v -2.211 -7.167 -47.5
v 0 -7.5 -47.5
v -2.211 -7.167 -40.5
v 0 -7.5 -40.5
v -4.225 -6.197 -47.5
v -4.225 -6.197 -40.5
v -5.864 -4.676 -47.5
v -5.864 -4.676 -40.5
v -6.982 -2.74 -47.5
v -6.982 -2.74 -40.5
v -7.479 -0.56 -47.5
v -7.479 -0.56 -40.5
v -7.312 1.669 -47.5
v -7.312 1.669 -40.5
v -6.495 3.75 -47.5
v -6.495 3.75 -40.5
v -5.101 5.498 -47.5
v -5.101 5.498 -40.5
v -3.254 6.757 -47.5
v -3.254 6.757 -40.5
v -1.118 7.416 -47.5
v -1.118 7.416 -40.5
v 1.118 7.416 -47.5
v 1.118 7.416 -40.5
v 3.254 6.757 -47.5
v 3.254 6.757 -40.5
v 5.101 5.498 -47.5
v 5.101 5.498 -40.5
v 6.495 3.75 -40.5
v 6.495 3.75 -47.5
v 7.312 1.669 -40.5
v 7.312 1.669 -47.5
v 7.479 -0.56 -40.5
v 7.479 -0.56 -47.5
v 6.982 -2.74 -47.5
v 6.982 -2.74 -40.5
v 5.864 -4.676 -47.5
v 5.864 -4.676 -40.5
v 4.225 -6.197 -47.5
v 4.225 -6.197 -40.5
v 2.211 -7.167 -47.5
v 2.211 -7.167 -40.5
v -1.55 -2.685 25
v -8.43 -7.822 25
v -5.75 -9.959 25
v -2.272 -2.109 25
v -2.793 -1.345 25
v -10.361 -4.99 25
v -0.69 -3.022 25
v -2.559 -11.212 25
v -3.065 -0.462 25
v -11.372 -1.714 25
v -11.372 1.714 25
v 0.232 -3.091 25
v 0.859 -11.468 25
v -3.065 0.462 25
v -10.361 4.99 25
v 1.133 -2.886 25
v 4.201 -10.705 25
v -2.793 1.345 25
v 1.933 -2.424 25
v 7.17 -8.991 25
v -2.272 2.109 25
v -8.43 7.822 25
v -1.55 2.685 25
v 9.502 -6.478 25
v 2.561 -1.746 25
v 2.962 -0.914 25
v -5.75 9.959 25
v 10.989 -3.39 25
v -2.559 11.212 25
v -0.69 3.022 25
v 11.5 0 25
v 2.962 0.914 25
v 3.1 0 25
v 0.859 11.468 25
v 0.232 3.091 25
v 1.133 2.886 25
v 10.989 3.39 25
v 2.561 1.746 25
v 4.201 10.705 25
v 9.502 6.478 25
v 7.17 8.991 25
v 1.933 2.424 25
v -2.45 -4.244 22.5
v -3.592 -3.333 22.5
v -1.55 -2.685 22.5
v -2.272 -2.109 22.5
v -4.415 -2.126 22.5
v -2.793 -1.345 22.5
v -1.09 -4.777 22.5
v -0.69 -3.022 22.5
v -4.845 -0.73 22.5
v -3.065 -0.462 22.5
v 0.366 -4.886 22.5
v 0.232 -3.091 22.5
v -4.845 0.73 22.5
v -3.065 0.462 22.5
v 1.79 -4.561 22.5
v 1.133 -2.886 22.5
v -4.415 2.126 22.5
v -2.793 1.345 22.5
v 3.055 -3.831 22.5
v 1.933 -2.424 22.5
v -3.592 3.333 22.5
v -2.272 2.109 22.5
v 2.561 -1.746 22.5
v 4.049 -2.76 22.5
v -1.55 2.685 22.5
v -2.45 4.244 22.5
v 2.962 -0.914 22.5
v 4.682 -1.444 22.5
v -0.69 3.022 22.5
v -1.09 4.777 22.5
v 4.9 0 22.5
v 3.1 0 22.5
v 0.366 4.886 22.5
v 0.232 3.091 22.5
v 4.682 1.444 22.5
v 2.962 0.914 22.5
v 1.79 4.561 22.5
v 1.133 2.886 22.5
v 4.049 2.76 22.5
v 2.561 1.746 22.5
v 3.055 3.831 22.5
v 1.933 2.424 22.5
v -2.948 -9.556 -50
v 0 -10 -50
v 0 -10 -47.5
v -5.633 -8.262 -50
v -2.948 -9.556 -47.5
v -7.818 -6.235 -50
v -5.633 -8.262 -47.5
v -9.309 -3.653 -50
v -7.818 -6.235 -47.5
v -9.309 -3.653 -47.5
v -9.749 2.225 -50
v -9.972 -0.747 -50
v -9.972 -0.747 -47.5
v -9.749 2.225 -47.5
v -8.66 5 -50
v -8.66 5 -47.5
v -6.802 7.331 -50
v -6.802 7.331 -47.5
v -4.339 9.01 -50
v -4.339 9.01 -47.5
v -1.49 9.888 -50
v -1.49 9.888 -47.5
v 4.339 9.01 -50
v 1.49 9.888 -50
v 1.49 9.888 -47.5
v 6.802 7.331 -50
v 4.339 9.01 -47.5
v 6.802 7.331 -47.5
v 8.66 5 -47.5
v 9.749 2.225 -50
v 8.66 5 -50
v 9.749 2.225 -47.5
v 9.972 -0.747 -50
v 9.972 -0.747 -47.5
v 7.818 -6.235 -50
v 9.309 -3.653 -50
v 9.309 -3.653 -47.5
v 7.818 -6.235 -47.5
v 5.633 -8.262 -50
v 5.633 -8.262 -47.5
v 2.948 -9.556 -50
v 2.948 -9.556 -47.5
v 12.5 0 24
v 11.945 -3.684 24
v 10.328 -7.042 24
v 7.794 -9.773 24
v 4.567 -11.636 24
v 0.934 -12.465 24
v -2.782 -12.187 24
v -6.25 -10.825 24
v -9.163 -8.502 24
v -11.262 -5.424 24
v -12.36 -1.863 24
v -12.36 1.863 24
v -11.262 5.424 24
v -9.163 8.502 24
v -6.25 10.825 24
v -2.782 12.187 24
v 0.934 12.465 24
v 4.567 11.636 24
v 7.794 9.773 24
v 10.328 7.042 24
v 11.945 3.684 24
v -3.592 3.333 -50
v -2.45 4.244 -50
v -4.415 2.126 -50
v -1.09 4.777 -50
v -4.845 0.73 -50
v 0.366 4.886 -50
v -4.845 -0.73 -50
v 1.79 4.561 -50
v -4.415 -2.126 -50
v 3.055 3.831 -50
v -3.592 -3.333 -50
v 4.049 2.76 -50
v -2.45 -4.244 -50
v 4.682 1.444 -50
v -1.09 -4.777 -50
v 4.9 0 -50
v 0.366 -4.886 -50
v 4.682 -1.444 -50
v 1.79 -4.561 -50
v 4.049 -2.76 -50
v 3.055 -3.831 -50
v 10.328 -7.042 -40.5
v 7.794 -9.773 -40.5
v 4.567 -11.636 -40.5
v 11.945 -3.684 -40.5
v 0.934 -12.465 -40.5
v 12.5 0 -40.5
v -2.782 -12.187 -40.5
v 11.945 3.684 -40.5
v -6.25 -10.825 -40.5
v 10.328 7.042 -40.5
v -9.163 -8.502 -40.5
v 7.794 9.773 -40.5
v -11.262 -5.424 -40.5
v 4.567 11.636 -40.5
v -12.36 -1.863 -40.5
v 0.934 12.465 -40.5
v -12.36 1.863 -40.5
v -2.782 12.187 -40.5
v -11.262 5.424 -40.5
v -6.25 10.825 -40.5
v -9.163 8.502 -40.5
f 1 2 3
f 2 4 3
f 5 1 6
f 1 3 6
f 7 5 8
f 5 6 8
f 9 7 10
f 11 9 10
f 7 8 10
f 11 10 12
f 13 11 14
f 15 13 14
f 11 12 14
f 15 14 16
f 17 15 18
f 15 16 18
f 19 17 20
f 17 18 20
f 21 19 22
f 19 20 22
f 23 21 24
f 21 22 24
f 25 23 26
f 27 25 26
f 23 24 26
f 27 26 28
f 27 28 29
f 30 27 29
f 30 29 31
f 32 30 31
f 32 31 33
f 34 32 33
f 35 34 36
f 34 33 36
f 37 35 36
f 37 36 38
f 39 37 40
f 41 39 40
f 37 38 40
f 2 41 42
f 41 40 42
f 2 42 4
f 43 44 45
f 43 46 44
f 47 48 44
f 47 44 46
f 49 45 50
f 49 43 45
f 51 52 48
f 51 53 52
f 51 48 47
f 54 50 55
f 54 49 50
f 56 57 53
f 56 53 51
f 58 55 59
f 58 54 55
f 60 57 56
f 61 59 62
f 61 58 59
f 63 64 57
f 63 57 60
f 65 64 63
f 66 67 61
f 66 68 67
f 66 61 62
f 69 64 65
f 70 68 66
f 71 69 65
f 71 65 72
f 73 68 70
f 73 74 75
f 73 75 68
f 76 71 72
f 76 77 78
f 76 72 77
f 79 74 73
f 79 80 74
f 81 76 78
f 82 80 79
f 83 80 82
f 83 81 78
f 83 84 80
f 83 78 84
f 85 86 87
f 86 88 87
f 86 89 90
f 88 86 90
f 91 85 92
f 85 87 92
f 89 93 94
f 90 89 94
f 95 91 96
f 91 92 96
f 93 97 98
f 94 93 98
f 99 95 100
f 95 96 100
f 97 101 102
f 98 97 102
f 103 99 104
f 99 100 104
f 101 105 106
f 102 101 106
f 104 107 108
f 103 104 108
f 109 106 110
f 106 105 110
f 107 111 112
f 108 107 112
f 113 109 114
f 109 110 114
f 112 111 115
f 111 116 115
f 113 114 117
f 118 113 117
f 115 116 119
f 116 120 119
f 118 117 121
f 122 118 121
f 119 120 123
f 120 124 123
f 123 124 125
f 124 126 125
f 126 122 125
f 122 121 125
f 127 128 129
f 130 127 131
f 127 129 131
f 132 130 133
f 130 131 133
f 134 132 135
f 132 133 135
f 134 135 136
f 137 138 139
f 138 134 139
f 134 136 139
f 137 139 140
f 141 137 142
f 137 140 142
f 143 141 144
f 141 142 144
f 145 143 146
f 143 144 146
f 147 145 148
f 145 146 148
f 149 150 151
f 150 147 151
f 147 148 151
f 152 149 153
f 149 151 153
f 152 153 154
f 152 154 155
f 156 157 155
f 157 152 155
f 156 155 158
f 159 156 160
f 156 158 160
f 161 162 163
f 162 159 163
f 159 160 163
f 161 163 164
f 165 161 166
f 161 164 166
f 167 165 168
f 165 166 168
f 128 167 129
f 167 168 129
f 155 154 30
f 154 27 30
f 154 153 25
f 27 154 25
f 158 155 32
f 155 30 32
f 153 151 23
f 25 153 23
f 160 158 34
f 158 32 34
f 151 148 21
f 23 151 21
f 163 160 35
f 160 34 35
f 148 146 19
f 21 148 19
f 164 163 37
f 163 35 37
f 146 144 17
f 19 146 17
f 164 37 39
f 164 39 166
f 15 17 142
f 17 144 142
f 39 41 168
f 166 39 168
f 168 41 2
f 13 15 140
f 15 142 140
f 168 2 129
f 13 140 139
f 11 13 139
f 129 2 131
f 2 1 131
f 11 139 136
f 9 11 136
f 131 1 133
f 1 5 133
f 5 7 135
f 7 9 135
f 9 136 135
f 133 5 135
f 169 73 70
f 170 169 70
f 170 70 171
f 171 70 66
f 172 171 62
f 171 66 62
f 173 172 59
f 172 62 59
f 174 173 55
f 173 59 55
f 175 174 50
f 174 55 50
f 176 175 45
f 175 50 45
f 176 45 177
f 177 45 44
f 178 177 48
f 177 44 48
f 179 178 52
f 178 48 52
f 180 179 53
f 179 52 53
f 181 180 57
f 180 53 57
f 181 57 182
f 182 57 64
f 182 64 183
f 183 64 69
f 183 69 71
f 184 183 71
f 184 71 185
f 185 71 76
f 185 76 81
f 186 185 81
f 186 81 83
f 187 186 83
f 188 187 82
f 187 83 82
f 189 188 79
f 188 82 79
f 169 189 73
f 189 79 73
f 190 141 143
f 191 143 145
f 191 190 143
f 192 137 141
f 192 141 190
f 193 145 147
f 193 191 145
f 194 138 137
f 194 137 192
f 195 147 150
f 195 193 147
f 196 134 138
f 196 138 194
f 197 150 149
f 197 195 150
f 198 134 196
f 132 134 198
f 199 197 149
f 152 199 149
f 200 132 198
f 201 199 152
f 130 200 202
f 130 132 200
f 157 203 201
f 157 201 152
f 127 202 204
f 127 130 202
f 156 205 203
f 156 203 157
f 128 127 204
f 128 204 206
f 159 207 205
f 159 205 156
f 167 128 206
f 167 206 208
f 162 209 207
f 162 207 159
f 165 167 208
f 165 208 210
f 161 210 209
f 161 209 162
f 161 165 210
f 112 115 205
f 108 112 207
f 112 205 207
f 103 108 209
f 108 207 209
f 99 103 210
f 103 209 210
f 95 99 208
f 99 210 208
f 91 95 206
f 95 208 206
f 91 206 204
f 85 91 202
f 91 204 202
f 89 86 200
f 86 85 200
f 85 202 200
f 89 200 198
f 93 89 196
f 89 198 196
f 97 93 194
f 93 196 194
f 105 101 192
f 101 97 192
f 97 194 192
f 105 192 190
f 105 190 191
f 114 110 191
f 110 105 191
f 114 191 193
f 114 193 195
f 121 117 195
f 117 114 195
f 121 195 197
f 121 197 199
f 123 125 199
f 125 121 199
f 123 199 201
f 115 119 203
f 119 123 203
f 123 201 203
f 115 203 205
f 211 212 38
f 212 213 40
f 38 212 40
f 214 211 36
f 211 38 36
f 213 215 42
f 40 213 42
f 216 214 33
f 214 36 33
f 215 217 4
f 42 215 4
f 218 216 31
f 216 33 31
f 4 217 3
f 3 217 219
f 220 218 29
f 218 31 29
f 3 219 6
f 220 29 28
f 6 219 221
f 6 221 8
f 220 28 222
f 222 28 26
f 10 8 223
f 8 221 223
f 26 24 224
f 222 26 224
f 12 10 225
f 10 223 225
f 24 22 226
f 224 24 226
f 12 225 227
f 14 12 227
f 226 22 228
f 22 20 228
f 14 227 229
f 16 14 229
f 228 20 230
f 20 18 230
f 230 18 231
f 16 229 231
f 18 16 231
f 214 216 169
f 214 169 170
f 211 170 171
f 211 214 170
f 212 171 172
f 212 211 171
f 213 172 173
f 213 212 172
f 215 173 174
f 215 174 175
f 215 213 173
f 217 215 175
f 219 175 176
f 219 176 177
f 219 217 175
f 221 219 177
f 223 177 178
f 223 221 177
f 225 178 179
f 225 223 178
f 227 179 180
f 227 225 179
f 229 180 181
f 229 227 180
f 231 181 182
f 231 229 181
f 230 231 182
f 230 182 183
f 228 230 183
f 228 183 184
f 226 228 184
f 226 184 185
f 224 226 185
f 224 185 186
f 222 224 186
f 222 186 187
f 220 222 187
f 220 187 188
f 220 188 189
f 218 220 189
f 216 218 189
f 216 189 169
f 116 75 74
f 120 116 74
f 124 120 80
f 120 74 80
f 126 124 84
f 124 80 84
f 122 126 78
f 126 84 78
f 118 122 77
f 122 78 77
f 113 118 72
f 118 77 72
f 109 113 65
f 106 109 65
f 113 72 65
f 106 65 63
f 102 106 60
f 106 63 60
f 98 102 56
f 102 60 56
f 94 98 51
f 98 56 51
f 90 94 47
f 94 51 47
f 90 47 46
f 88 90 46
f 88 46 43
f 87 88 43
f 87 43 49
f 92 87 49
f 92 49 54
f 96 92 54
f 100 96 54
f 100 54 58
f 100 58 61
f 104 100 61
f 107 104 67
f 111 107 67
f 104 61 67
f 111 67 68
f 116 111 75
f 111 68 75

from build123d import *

# Parameters (mm, degrees)
F0_R      = 21.5
F1_DEPTH  = 40
F2_R      = 5
F3_R      = 21.5
F4_DEPTH  = 40
F5_SIZE2  = 7.5
F5_SIZE   = 40
F6_DEPTH  = 10
F7_R      = 10
F10_R     = 4.9
F11_DEPTH = 75
F12_R     = 16.5
F13_DEPTH = 5
F14_R     = 3.1
F15_DEPTH = 85.001
F16_R     = 45.5023146051
F16_R_2   = 12.5
F17_DEPTH = 100
F18_W     = 86.4328397527
F18_H     = 43.3590536159
F19_DEPTH = 25
F20_SIZE  = 1
F21_R     = 4.9
F21_R_2   = 3.1
F22_DEPTH = 2.5


with BuildPart() as f1:
    # F0 (on Top) → F1 (new body)
    with BuildSketch(Plane.XY):
        Circle(F0_R)
    extrude(amount=F1_DEPTH)

    # F2
    f2_edges = [f1.edges().sort_by_distance(p)[0] for p in [
        (-21.5, 0, 40),
    ]]
    fillet(f2_edges, radius=F2_R)

    # F3 (on face) → F4 (join)
    with BuildSketch(Plane(origin=(0, 0, 0), x_dir=(1, 0, 0), z_dir=(0, 0, -1))):
        Circle(F3_R)
    extrude(amount=F4_DEPTH)

    # F5
    f5_edges = [f1.edges().sort_by_distance(p)[0] for p in [
        (-21.5, 0, -40),
    ]]
    chamfer(f5_edges, length=F5_SIZE, length2=F5_SIZE2)

    # F6 (add): a face of the model
    f6_faces = [f1.faces().sort_by_distance(p)[0] for p in [
        (0, 0, -40),
    ]]
    extrude(f6_faces, amount=F6_DEPTH)

    # F7
    f7_edges = [f1.edges().sort_by_distance(p)[0] for p in [
        (-21.5, 0, 0),
    ]]
    fillet(f7_edges, radius=F7_R)

    # F8 (on Right) → F9 (revolve, cut)
    with BuildSketch(Plane.YZ):
        Polygon((-7.5, -40.5), (-17.4298945979, -40.5), (-17.4298945979, -47.5), (-17.4298945979, -53.659953177), (-10, -53.659953177), (-10, -47.5), (-7.5, -47.5), align=None)
    revolve(axis=Axis((0, 0, -53.4000843763), (0, 0, -1)), mode=Mode.SUBTRACT)

    # F10 (on face) → F11 (cut)
    with BuildSketch(Plane(origin=(0, 0, -50), x_dir=(1, 0, 0), z_dir=(0, 0, -1))):
        Circle(F10_R)
    extrude(amount=-F11_DEPTH, mode=Mode.SUBTRACT)

    # F12 (on face) → F13 (cut)
    with BuildSketch(Plane.XY.offset(40)):
        Circle(F12_R)
    extrude(amount=-F13_DEPTH, mode=Mode.SUBTRACT)

    # F14 (on face) → F15 (cut, through all)
    with BuildSketch(Plane.XY.offset(35)):
        Circle(F14_R)
    extrude(amount=-F15_DEPTH, mode=Mode.SUBTRACT)

    # F16 (on face) → F17 (cut)
    with BuildSketch(Plane(origin=(0, 0, -50), x_dir=(1, 0, 0), z_dir=(0, 0, -1))):
        Circle(F16_R)
        Circle(F16_R_2, mode=Mode.SUBTRACT)
    extrude(amount=-F17_DEPTH, mode=Mode.SUBTRACT)

    # F18 (on Front) → F19 (cut, symmetric)
    with BuildSketch(Plane.XZ):
        with Locations((1.7612818629, 46.679526808)):
            Rectangle(F18_W, F18_H)
    extrude(amount=F19_DEPTH, both=True, mode=Mode.SUBTRACT)

    # F20
    f20_edges = [f1.edges().sort_by_distance(p)[0] for p in [
        (-12.5, 0, 25),
    ]]
    chamfer(f20_edges, length=F20_SIZE)

    # F21 (on face) → F22 (join)
    with BuildSketch(Plane.XY.offset(25)):
        Circle(F21_R)
        Circle(F21_R_2, mode=Mode.SUBTRACT)
    extrude(amount=-F22_DEPTH)


solid = f1.part
